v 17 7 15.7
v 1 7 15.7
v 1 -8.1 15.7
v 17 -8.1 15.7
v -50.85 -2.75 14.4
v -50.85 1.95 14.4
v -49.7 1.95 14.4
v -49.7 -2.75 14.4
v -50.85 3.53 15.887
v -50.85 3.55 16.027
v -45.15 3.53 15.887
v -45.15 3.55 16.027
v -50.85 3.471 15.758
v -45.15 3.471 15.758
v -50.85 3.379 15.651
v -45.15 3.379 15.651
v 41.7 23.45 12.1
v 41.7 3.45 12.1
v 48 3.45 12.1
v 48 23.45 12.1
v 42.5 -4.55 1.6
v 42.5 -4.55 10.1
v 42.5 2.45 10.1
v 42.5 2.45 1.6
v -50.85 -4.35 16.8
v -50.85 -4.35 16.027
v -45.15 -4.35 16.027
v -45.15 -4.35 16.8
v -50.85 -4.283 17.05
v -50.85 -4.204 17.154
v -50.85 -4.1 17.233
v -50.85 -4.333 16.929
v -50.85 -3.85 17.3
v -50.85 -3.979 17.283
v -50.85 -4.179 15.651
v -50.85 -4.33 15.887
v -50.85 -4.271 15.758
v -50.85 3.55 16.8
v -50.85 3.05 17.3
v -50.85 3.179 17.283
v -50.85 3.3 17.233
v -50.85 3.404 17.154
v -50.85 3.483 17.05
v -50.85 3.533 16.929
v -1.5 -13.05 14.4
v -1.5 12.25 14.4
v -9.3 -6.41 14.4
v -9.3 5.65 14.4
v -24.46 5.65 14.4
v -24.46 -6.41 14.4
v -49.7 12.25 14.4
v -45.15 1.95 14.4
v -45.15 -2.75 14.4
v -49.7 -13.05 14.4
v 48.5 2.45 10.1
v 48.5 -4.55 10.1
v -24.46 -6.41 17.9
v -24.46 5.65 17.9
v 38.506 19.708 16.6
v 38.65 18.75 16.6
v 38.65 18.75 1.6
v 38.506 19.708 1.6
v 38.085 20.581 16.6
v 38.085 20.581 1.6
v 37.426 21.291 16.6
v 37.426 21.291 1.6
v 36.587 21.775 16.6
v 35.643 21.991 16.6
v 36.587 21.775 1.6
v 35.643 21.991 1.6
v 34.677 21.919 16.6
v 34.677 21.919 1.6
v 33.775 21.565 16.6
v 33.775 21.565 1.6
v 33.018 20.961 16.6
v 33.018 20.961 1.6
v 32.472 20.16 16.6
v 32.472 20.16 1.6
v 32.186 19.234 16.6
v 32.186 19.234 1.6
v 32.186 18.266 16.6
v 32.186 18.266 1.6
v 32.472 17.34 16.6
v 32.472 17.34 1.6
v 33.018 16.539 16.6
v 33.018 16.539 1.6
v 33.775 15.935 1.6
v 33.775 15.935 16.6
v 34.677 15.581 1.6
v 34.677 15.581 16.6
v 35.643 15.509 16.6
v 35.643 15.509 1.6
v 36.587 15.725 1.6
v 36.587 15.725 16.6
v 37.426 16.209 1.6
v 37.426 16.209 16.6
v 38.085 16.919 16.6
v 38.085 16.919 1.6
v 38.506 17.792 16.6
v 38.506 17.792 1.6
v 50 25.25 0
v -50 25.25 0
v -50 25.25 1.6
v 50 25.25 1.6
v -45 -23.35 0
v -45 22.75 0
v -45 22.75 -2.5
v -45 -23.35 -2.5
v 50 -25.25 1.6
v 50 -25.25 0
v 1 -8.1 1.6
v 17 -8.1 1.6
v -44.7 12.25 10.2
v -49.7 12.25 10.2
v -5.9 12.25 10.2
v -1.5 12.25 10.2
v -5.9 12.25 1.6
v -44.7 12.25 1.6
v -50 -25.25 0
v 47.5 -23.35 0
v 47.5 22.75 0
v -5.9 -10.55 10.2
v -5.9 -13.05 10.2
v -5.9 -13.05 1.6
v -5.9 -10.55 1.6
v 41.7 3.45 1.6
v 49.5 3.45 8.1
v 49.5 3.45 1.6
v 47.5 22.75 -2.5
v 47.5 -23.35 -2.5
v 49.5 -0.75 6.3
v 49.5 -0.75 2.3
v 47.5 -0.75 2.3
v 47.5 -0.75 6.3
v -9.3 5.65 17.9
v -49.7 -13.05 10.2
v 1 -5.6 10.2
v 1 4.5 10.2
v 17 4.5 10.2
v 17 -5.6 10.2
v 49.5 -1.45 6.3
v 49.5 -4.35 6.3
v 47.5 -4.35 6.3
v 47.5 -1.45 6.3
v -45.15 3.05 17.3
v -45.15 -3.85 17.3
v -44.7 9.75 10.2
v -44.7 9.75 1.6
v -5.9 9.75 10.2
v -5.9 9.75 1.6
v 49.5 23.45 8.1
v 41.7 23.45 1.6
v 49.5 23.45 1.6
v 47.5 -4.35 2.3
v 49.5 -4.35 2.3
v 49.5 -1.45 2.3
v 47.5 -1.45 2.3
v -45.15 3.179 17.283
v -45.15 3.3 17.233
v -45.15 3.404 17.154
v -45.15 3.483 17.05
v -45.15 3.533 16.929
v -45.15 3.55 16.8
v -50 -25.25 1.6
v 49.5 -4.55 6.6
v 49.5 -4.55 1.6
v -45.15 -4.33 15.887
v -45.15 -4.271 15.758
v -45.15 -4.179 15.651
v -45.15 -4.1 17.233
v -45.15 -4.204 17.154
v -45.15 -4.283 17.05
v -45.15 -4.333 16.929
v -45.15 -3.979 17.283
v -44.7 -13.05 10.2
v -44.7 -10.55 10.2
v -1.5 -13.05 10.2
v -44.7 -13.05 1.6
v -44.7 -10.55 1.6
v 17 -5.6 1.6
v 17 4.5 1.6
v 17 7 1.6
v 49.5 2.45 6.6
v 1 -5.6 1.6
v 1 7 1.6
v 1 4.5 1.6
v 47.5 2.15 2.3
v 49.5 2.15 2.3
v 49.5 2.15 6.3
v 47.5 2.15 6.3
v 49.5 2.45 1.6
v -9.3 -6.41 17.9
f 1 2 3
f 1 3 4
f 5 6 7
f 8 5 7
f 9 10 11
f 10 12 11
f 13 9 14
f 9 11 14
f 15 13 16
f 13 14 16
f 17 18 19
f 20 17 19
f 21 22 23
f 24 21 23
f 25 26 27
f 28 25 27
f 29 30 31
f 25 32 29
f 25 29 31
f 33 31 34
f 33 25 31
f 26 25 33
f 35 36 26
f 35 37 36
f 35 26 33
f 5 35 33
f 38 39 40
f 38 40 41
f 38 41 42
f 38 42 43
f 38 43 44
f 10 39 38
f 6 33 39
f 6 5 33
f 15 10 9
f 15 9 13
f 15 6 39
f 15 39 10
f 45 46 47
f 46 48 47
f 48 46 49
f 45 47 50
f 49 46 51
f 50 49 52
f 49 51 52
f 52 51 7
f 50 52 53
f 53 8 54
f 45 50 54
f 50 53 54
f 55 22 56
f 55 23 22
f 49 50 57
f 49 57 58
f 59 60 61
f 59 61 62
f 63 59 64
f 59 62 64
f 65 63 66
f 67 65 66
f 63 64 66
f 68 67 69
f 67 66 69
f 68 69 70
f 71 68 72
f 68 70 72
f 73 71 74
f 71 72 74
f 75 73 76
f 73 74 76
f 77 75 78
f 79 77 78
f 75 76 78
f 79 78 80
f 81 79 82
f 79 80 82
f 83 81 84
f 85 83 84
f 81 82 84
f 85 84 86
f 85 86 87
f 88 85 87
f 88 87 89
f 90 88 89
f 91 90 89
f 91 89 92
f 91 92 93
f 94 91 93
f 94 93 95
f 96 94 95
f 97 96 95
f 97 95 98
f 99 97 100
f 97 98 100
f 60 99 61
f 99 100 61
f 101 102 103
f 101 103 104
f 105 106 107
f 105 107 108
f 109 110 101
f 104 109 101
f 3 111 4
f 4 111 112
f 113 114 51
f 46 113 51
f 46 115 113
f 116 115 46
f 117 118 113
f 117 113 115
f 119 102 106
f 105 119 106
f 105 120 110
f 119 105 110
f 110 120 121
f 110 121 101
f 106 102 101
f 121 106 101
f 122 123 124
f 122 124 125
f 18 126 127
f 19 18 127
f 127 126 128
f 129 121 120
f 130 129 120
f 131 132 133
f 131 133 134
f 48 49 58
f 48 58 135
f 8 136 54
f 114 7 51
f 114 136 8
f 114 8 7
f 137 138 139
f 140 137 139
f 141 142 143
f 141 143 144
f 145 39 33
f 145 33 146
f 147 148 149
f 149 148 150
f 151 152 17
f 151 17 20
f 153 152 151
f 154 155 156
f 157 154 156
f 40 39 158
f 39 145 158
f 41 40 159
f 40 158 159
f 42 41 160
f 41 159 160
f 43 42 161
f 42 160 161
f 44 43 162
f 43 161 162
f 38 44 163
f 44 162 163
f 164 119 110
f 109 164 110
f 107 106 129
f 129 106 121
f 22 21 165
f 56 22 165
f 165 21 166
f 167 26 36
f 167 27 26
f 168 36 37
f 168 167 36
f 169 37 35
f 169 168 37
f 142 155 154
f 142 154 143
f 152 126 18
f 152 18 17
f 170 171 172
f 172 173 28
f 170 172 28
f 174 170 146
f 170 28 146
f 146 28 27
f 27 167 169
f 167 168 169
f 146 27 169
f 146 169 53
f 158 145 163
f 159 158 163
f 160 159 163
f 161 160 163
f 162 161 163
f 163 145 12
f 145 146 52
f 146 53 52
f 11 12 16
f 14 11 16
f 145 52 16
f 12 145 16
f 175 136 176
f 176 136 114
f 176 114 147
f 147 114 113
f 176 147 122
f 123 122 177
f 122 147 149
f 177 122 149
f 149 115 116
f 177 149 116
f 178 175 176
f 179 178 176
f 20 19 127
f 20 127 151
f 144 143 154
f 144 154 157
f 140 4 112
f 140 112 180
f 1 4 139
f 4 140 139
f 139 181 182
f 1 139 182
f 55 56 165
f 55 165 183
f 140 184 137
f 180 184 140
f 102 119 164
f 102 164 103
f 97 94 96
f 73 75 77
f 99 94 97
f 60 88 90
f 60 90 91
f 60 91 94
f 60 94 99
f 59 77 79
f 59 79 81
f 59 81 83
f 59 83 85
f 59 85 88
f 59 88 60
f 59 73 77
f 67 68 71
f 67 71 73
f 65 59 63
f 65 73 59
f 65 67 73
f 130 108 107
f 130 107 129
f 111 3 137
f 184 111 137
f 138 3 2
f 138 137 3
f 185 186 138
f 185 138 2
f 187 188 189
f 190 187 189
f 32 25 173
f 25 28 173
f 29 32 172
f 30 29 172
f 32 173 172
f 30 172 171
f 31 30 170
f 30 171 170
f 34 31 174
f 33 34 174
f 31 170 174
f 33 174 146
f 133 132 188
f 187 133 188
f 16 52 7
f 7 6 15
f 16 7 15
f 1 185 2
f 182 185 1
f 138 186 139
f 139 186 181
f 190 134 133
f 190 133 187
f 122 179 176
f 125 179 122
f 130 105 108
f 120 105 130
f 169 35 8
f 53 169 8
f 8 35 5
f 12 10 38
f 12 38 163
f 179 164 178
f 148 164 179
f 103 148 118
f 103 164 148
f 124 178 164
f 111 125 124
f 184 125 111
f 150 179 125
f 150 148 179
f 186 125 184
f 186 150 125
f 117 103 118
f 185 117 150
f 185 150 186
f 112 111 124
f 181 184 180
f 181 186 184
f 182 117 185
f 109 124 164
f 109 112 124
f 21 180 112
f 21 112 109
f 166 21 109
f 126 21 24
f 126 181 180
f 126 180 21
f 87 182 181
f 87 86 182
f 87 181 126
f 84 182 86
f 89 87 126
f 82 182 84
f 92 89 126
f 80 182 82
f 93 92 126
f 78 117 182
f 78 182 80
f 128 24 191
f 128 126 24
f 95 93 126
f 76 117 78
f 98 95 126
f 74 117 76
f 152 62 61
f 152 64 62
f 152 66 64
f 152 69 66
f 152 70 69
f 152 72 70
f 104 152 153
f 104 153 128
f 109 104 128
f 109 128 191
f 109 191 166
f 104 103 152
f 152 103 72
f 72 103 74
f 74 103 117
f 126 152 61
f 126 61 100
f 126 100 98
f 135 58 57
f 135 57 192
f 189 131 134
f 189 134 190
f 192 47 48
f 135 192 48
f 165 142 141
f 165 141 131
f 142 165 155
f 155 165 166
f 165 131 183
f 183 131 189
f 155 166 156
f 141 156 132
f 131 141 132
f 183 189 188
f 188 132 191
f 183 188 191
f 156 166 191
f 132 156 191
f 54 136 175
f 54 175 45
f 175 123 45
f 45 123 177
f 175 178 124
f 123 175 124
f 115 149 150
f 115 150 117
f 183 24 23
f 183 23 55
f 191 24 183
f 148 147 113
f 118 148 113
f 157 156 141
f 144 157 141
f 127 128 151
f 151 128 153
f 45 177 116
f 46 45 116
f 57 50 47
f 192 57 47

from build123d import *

# Parameters (mm, degrees)
F0_W      = 100
F0_H      = 50.5
F1_DEPTH  = 1.6
F2_W      = 7.8
F2_H      = 20
F3_DEPTH  = 10.5
F4_SIZE2  = 1.5
F4_SIZE   = 4
F2_W_2    = 7
F2_H_2    = 7
F5_DEPTH  = 8.5
F6_SIZE2  = 1
F6_SIZE   = 3.5
F2_R      = 3.25
F7_DEPTH  = 15
F2_W_3    = 38.8
F2_H_3    = 2.5
F2_W_4    = 16
F8_DEPTH  = 8.6
F9_W      = 92.5
F9_H      = 46.1
F10_DEPTH = 2.5
F11_W     = 2.9
F11_H     = 4
F12_DEPTH = 2
F13_W     = 16
F13_H     = 15.1
F14_DEPTH = 5.5
F15_W     = 48.2
F15_H     = 25.3
F16_DEPTH = 4.2
F17_W     = 15.16
F17_H     = 12.06
F18_DEPTH = 3.5
F19_W     = 5.7
F19_H     = 7.9
F20_DEPTH = 2.9
F22_DEPTH = 5.7
F23_R     = 0.5


with BuildPart() as f1:
    # F0 (on Top) → F1 (new body)
    with BuildSketch(Plane.XY):
        Rectangle(F0_W, F0_H)
    extrude(amount=F1_DEPTH)

    # F2 (on face) → F3 (join)
    with BuildSketch(Plane.XY.offset(1.6)):
        with Locations((45.6, 13.45)):
            Rectangle(F2_W, F2_H)
    extrude(amount=F3_DEPTH)

    # F4
    f4_edges = [f1.edges().sort_by_distance(p)[0] for p in [
        (49.5, 13.45, 12.1),
    ]]
    f4_side = f1.faces().sort_by_distance((49.5, 13.45, 6.85))[0]
    chamfer(f4_edges, length=F4_SIZE, length2=F4_SIZE2, reference=f4_side)

    # F2 (on face) → F5 (join)
    with BuildSketch(Plane.XY.offset(1.6)):
        with Locations((46, -1.05)):
            Rectangle(F2_W_2, F2_H_2)
    extrude(amount=F5_DEPTH)

    # F6
    f6_edges = [f1.edges().sort_by_distance(p)[0] for p in [
        (49.5, -1.05, 10.1),
    ]]
    f6_side = f1.faces().sort_by_distance((49.5, -1.05, 5.85))[0]
    chamfer(f6_edges, length=F6_SIZE, length2=F6_SIZE2, reference=f6_side)

    # F2 (on face) → F7 (join)
    with BuildSketch(Plane.XY.offset(1.6)):
        with Locations((35.4, 18.75)):
            Circle(F2_R)
    extrude(amount=F7_DEPTH)

    # F2 (on face) → F8 (join)
    with BuildSketch(Plane.XY.offset(1.6)):
        with Locations((-25.3, 11)):
            Rectangle(F2_W_3, F2_H_3)
        with Locations((9, 5.75)):
            Rectangle(F2_W_4, F2_H_3)
        with Locations((9, -6.85)):
            Rectangle(F2_W_4, F2_H_3)
        with Locations((-25.3, -11.8)):
            Rectangle(F2_W_3, F2_H_3)
    extrude(amount=F8_DEPTH)

    # F9 (on face) → F10 (join)
    with BuildSketch(Plane(origin=(0, 0, 0), x_dir=(1, 0, 0), z_dir=(0, 0, -1))):
        with Locations((1.25, 0.3)):
            Rectangle(F9_W, F9_H)
    extrude(amount=F10_DEPTH)

    # F11 (on face) → F12 (cut)
    with BuildSketch(Plane.YZ.offset(49.5)):
        with Locations((-2.9, 4.3)):
            Rectangle(F11_W, F11_H)
        with Locations((0.7, 4.3)):
            Rectangle(F11_W, F11_H)
    extrude(amount=-F12_DEPTH, mode=Mode.SUBTRACT)

    # F13 (on face) → F14 (join)
    with BuildSketch(Plane.XY.offset(10.2)):
        with Locations((9, -0.55)):
            Rectangle(F13_W, F13_H)
    extrude(amount=F14_DEPTH)

    # F15 (on face) → F16 (join)
    with BuildSketch(Plane.XY.offset(10.2)):
        with Locations((-25.6, -0.4)):
            Rectangle(F15_W, F15_H)
    extrude(amount=F16_DEPTH)

    # F17 (on face) → F18 (join)
    with BuildSketch(Plane.XY.offset(14.4)):
        with Locations((-16.88, -0.38)):
            Rectangle(F17_W, F17_H)
    extrude(amount=F18_DEPTH)

    # F19 (on face) → F20 (join)
    with BuildSketch(Plane.XY.offset(14.4)):
        with Locations((-48, -0.4)):
            Rectangle(F19_W, F19_H)
    extrude(amount=F20_DEPTH)

    # F21 (on face) → F22 (cut, through all)
    with BuildSketch(Plane(origin=(-50.85, 0, 0), x_dir=(0, -1, 0), z_dir=(-1, 0, 0))):
        Polygon((4.35, 14.4), (4.35, 15.8), (2.75, 14.4), align=None)
        Polygon((-3.55, 15.8), (-3.55, 14.4), (-1.95, 14.4), align=None)
    extrude(amount=-F22_DEPTH, mode=Mode.SUBTRACT)

    # F23
    f23_edges = [f1.edges().sort_by_distance(p)[0] for p in [
        (-48, 3.55, 15.8),
        (-48, 3.55, 17.3),
        (-48, -4.35, 17.3),
        (-48, -4.35, 15.8),
    ]]
    fillet(f23_edges, radius=F23_R)


solid = f1.part
